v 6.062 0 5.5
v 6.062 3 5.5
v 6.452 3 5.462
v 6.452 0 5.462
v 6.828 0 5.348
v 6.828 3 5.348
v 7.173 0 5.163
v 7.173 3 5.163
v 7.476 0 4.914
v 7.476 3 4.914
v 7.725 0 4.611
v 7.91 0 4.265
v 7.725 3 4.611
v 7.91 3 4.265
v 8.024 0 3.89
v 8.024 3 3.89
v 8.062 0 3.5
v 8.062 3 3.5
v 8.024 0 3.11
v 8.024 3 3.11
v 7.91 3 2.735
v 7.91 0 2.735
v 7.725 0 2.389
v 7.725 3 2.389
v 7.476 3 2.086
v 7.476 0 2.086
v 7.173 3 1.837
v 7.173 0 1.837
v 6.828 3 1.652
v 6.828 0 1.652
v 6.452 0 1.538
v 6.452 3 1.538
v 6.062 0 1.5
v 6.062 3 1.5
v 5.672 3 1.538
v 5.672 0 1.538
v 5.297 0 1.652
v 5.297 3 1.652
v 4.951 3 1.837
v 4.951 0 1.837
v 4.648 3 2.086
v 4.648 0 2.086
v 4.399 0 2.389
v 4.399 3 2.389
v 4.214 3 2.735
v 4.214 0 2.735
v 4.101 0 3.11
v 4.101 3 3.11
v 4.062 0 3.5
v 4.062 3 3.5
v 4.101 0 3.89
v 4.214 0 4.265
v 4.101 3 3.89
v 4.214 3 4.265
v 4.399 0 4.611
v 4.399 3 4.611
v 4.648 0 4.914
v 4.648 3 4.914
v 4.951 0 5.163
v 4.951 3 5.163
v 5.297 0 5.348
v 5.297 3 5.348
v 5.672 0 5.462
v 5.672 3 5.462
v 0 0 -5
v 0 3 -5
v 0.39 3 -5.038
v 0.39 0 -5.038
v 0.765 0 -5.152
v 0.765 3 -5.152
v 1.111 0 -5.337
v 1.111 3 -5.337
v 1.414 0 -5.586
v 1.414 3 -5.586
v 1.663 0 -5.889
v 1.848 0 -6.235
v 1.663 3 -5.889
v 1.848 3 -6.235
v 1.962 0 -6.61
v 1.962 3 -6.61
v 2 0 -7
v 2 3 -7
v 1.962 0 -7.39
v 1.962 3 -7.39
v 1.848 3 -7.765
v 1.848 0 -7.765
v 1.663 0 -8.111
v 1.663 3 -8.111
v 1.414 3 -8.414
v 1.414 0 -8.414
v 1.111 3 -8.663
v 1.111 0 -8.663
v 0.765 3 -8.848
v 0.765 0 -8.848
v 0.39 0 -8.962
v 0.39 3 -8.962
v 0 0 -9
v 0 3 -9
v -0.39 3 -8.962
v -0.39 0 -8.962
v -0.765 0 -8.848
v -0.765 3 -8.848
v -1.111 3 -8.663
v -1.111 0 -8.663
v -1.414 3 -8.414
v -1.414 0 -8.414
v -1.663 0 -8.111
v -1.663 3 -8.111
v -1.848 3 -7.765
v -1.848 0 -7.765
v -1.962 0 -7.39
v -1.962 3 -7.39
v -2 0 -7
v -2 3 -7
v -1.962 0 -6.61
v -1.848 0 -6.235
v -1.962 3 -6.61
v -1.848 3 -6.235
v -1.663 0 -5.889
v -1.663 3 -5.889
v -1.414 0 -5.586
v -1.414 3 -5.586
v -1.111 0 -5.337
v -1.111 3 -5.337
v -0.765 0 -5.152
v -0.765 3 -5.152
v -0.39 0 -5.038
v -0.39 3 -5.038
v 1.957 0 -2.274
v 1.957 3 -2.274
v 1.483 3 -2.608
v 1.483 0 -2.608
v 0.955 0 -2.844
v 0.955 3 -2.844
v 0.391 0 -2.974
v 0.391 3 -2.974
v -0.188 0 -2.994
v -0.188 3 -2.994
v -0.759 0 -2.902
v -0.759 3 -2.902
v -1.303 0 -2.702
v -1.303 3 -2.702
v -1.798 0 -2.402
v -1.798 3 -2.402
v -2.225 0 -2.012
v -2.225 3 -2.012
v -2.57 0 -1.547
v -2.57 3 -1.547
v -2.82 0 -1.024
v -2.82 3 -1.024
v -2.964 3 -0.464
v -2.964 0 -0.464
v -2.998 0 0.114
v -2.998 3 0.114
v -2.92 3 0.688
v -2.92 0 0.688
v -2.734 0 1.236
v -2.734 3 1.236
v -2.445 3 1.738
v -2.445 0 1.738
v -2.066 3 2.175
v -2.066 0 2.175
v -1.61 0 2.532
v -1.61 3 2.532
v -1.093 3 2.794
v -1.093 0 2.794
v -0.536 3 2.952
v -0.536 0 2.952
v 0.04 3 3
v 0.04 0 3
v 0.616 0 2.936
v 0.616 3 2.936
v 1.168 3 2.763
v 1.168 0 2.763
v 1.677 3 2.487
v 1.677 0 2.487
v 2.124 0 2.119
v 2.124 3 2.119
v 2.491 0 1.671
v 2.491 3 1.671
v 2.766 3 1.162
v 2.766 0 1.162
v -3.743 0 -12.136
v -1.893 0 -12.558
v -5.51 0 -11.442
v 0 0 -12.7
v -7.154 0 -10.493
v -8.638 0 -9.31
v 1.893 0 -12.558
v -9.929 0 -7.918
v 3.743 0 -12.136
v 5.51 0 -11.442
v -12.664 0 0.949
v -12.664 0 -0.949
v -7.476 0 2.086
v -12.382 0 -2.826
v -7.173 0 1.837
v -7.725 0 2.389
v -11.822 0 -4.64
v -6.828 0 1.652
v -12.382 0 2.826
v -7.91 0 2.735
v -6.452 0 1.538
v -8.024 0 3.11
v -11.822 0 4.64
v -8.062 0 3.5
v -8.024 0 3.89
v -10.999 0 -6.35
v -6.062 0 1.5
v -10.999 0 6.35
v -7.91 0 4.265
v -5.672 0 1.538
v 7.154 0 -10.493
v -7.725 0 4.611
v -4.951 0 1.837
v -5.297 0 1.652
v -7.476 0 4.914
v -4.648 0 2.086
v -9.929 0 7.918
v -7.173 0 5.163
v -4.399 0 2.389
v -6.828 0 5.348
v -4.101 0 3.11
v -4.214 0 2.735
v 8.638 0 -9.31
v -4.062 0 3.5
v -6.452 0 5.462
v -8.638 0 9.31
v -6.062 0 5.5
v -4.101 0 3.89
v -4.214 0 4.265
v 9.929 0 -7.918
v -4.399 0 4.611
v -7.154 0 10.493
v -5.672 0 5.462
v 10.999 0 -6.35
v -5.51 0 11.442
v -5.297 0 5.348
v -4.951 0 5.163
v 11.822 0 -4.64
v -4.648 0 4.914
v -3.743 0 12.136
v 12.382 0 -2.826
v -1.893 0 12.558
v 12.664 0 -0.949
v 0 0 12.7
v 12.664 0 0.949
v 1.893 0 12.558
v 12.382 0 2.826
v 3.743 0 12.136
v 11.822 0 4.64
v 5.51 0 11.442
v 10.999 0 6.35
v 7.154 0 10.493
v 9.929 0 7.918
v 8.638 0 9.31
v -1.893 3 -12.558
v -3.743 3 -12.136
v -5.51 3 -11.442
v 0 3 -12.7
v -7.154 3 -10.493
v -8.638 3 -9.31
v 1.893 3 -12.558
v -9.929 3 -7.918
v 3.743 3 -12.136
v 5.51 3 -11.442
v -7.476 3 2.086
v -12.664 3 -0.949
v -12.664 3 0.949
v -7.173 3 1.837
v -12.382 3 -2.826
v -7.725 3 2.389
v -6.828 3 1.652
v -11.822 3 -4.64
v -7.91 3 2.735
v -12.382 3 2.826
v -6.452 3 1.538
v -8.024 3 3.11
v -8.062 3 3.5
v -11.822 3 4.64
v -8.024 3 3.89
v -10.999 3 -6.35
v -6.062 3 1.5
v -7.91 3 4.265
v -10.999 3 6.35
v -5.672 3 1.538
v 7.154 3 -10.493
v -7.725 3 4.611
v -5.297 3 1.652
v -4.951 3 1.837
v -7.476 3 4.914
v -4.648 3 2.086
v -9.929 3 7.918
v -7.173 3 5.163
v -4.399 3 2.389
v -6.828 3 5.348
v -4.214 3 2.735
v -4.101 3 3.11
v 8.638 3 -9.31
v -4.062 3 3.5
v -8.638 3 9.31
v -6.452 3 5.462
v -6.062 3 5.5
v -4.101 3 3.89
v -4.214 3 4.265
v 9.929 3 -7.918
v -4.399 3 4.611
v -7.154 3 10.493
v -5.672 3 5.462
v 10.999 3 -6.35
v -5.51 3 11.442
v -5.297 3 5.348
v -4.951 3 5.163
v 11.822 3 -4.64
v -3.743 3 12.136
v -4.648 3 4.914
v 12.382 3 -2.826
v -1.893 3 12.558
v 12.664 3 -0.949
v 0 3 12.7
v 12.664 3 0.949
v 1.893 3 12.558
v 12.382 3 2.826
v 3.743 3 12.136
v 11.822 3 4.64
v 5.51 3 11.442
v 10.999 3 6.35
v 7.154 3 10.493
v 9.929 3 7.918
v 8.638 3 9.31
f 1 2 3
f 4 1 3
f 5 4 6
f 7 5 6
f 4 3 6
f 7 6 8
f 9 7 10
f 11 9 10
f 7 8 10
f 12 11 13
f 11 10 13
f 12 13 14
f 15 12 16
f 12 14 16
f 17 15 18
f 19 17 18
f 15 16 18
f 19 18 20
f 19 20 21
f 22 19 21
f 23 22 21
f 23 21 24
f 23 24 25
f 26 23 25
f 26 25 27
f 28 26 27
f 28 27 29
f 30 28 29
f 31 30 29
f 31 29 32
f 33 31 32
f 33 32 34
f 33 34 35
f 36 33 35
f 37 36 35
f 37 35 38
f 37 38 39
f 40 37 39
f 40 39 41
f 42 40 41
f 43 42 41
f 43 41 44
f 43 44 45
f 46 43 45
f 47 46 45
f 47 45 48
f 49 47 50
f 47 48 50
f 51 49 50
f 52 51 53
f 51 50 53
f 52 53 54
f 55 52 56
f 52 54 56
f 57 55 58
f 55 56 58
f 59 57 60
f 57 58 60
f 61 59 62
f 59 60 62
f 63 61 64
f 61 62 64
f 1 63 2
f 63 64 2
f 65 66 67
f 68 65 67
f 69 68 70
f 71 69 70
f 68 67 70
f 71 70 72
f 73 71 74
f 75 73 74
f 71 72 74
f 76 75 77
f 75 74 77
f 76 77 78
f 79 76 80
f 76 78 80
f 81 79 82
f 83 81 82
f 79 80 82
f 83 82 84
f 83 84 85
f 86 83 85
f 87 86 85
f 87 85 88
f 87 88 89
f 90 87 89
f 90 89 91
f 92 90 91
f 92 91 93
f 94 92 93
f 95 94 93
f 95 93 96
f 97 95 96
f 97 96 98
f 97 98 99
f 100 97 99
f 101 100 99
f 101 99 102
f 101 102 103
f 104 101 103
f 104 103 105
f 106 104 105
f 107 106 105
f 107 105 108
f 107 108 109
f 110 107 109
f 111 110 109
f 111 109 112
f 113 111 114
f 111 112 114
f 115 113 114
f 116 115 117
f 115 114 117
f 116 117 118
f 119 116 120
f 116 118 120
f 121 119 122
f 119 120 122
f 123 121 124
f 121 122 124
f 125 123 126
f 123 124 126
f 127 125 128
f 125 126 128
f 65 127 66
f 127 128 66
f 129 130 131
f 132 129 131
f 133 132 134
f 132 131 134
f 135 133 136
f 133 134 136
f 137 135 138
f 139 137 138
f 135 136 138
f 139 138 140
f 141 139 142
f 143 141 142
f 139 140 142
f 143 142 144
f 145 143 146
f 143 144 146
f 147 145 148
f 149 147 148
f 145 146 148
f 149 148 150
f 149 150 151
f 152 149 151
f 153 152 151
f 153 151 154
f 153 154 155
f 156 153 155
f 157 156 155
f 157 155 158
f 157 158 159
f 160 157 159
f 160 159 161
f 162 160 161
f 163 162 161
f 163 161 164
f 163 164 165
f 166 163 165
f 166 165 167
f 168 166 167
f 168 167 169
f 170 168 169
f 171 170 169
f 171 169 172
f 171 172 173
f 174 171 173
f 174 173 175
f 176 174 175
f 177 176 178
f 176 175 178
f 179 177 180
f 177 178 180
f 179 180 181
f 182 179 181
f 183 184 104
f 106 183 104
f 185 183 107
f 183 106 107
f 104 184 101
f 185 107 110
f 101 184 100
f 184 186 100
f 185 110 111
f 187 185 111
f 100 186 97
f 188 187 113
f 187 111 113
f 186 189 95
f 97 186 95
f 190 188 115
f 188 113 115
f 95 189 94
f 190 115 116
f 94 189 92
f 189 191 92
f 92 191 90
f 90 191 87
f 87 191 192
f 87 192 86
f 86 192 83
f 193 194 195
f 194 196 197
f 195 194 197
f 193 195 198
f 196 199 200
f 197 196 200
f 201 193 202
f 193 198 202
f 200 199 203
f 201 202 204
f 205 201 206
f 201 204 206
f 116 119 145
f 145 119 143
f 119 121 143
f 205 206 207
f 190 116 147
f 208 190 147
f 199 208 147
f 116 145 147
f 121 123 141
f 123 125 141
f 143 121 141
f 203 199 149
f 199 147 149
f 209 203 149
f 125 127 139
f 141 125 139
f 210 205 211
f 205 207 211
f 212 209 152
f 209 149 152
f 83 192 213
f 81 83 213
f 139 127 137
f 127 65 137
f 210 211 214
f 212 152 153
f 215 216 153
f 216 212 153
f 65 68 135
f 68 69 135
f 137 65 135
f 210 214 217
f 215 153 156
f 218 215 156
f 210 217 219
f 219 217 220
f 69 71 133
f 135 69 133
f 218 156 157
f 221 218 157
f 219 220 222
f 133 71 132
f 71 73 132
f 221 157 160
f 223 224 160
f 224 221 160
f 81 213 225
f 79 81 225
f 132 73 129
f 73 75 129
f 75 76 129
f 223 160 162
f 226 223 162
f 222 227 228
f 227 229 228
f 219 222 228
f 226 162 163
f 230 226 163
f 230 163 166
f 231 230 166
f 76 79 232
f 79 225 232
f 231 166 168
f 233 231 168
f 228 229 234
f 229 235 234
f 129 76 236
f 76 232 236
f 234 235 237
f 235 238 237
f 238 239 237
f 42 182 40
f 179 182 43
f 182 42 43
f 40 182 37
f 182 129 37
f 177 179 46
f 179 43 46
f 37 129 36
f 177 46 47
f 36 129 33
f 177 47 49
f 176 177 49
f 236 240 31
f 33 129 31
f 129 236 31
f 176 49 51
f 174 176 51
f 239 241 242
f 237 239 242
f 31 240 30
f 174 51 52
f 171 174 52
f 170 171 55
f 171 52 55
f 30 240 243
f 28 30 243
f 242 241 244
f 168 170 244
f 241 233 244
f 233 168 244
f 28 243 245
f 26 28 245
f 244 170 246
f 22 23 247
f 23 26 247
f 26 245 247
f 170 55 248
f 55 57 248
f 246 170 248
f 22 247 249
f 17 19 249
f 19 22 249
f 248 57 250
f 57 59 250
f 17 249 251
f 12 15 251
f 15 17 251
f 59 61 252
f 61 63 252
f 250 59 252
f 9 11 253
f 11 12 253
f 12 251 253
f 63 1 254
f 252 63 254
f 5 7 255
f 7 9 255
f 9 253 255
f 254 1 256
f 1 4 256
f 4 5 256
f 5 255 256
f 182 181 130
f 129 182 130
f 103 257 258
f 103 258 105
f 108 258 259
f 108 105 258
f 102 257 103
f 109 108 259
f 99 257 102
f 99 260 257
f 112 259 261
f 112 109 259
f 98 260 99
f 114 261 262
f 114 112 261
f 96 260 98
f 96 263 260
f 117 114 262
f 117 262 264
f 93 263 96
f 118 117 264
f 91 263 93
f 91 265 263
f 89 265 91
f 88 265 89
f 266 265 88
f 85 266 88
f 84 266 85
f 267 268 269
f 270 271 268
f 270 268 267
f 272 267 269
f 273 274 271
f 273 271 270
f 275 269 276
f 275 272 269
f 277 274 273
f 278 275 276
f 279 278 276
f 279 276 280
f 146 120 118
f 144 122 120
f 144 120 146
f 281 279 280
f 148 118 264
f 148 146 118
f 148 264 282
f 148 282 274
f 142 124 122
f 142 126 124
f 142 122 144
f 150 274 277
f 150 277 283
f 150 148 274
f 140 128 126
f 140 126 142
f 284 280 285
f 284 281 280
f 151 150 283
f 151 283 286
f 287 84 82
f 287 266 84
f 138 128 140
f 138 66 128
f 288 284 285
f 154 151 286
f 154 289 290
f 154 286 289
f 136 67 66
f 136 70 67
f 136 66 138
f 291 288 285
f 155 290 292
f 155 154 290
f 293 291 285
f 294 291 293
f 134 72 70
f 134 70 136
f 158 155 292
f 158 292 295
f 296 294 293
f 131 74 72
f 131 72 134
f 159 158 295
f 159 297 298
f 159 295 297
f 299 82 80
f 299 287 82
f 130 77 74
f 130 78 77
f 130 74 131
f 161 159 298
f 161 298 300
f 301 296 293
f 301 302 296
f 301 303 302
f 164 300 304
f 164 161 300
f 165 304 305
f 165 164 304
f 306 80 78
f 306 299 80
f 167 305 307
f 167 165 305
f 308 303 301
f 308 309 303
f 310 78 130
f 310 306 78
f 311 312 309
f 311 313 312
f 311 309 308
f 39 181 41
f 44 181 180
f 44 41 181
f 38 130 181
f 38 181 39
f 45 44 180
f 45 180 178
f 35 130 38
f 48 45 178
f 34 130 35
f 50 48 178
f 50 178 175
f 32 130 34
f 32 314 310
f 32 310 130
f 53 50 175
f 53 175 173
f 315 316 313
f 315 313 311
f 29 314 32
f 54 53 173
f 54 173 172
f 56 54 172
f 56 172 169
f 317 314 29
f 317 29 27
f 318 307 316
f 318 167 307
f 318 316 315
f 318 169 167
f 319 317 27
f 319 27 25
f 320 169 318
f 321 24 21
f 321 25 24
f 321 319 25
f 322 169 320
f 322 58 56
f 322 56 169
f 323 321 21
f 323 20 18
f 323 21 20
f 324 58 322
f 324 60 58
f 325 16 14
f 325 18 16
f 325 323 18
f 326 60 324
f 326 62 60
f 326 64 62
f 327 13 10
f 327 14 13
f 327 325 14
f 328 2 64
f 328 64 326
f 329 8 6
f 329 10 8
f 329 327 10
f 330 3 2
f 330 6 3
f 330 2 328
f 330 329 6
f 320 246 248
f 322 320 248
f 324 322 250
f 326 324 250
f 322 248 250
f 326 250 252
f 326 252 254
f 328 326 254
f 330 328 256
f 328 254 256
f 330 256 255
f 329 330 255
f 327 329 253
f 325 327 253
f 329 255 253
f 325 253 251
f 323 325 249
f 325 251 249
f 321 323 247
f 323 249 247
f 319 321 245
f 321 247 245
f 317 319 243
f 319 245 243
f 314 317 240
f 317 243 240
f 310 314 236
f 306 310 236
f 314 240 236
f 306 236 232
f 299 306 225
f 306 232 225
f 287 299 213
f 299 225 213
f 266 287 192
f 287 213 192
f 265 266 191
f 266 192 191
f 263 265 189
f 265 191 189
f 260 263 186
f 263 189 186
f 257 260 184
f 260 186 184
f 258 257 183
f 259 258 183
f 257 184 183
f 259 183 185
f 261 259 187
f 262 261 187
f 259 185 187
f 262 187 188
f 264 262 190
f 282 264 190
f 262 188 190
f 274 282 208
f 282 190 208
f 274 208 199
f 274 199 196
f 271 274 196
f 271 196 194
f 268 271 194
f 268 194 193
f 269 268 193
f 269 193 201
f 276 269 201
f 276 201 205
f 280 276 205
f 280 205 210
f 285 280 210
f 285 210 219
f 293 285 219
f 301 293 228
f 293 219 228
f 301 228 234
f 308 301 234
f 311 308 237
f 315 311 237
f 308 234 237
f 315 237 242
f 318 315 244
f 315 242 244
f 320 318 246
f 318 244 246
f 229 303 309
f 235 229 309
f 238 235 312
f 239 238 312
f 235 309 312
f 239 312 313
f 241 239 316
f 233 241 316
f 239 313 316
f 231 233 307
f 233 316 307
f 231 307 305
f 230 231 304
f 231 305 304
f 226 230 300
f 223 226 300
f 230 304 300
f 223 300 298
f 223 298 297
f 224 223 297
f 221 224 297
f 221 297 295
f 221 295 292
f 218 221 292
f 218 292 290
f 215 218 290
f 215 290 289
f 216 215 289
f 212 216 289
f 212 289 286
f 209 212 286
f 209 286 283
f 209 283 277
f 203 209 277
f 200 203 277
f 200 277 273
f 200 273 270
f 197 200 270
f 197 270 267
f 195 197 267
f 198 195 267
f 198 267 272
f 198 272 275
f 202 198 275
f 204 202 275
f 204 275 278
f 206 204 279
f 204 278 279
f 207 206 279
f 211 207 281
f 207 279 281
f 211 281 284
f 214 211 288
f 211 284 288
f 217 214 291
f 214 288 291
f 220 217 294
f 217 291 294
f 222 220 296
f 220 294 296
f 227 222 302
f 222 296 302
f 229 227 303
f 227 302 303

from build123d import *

# Parameters (mm, degrees)
SKETCH1_R           = 12.7
BOSS_EXTRUDE1_DEPTH = 3
CUT_EXTRUDE1_DEPTH  = 10
SKETCH3_R           = 2
CUT_EXTRUDE2_DEPTH  = 5


with BuildPart() as part:
    # Sketch1 → Boss-Extrude1 (new body)
    with BuildSketch(Plane(origin=(0, 0, 0), x_dir=(1, 0, 0), z_dir=(0, 1, 0))):
        with Locations(Location((0, 0, 0), (0, 0, 270))):
            Circle(SKETCH1_R)
    extrude(amount=BOSS_EXTRUDE1_DEPTH)

    # Sketch2 → Cut-Extrude1 (cut)
    with BuildSketch(Plane(origin=(0, 3, 0), x_dir=(1, 0, 0), z_dir=(0, 1, 0))):
        with BuildLine():
            Line((2.765935685, -1.161722767), (1.956504764, 2.274222748))
            ThreePointArc((1.956504764, 2.274222748), (-2.92006701, -0.687901633), (2.765935685, -1.161722767))
        make_face()
    extrude(amount=-CUT_EXTRUDE1_DEPTH, mode=Mode.SUBTRACT)

    # Sketch3 → Cut-Extrude2 (cut)
    with BuildSketch(Plane(origin=(0, 3, 0), x_dir=(1, 0, 0), z_dir=(0, 1, 0))):
        with Locations(Location((0, 7, 0), (0, 0, 270))):
            Circle(SKETCH3_R)
        with Locations(Location((6.062177826, -3.5, 0), (0, 0, 270))):
            Circle(SKETCH3_R)
        with Locations(Location((-6.062177826, -3.5, 0), (0, 0, 270))):
            Circle(SKETCH3_R)
    extrude(amount=-CUT_EXTRUDE2_DEPTH, mode=Mode.SUBTRACT)


solid = part.part
